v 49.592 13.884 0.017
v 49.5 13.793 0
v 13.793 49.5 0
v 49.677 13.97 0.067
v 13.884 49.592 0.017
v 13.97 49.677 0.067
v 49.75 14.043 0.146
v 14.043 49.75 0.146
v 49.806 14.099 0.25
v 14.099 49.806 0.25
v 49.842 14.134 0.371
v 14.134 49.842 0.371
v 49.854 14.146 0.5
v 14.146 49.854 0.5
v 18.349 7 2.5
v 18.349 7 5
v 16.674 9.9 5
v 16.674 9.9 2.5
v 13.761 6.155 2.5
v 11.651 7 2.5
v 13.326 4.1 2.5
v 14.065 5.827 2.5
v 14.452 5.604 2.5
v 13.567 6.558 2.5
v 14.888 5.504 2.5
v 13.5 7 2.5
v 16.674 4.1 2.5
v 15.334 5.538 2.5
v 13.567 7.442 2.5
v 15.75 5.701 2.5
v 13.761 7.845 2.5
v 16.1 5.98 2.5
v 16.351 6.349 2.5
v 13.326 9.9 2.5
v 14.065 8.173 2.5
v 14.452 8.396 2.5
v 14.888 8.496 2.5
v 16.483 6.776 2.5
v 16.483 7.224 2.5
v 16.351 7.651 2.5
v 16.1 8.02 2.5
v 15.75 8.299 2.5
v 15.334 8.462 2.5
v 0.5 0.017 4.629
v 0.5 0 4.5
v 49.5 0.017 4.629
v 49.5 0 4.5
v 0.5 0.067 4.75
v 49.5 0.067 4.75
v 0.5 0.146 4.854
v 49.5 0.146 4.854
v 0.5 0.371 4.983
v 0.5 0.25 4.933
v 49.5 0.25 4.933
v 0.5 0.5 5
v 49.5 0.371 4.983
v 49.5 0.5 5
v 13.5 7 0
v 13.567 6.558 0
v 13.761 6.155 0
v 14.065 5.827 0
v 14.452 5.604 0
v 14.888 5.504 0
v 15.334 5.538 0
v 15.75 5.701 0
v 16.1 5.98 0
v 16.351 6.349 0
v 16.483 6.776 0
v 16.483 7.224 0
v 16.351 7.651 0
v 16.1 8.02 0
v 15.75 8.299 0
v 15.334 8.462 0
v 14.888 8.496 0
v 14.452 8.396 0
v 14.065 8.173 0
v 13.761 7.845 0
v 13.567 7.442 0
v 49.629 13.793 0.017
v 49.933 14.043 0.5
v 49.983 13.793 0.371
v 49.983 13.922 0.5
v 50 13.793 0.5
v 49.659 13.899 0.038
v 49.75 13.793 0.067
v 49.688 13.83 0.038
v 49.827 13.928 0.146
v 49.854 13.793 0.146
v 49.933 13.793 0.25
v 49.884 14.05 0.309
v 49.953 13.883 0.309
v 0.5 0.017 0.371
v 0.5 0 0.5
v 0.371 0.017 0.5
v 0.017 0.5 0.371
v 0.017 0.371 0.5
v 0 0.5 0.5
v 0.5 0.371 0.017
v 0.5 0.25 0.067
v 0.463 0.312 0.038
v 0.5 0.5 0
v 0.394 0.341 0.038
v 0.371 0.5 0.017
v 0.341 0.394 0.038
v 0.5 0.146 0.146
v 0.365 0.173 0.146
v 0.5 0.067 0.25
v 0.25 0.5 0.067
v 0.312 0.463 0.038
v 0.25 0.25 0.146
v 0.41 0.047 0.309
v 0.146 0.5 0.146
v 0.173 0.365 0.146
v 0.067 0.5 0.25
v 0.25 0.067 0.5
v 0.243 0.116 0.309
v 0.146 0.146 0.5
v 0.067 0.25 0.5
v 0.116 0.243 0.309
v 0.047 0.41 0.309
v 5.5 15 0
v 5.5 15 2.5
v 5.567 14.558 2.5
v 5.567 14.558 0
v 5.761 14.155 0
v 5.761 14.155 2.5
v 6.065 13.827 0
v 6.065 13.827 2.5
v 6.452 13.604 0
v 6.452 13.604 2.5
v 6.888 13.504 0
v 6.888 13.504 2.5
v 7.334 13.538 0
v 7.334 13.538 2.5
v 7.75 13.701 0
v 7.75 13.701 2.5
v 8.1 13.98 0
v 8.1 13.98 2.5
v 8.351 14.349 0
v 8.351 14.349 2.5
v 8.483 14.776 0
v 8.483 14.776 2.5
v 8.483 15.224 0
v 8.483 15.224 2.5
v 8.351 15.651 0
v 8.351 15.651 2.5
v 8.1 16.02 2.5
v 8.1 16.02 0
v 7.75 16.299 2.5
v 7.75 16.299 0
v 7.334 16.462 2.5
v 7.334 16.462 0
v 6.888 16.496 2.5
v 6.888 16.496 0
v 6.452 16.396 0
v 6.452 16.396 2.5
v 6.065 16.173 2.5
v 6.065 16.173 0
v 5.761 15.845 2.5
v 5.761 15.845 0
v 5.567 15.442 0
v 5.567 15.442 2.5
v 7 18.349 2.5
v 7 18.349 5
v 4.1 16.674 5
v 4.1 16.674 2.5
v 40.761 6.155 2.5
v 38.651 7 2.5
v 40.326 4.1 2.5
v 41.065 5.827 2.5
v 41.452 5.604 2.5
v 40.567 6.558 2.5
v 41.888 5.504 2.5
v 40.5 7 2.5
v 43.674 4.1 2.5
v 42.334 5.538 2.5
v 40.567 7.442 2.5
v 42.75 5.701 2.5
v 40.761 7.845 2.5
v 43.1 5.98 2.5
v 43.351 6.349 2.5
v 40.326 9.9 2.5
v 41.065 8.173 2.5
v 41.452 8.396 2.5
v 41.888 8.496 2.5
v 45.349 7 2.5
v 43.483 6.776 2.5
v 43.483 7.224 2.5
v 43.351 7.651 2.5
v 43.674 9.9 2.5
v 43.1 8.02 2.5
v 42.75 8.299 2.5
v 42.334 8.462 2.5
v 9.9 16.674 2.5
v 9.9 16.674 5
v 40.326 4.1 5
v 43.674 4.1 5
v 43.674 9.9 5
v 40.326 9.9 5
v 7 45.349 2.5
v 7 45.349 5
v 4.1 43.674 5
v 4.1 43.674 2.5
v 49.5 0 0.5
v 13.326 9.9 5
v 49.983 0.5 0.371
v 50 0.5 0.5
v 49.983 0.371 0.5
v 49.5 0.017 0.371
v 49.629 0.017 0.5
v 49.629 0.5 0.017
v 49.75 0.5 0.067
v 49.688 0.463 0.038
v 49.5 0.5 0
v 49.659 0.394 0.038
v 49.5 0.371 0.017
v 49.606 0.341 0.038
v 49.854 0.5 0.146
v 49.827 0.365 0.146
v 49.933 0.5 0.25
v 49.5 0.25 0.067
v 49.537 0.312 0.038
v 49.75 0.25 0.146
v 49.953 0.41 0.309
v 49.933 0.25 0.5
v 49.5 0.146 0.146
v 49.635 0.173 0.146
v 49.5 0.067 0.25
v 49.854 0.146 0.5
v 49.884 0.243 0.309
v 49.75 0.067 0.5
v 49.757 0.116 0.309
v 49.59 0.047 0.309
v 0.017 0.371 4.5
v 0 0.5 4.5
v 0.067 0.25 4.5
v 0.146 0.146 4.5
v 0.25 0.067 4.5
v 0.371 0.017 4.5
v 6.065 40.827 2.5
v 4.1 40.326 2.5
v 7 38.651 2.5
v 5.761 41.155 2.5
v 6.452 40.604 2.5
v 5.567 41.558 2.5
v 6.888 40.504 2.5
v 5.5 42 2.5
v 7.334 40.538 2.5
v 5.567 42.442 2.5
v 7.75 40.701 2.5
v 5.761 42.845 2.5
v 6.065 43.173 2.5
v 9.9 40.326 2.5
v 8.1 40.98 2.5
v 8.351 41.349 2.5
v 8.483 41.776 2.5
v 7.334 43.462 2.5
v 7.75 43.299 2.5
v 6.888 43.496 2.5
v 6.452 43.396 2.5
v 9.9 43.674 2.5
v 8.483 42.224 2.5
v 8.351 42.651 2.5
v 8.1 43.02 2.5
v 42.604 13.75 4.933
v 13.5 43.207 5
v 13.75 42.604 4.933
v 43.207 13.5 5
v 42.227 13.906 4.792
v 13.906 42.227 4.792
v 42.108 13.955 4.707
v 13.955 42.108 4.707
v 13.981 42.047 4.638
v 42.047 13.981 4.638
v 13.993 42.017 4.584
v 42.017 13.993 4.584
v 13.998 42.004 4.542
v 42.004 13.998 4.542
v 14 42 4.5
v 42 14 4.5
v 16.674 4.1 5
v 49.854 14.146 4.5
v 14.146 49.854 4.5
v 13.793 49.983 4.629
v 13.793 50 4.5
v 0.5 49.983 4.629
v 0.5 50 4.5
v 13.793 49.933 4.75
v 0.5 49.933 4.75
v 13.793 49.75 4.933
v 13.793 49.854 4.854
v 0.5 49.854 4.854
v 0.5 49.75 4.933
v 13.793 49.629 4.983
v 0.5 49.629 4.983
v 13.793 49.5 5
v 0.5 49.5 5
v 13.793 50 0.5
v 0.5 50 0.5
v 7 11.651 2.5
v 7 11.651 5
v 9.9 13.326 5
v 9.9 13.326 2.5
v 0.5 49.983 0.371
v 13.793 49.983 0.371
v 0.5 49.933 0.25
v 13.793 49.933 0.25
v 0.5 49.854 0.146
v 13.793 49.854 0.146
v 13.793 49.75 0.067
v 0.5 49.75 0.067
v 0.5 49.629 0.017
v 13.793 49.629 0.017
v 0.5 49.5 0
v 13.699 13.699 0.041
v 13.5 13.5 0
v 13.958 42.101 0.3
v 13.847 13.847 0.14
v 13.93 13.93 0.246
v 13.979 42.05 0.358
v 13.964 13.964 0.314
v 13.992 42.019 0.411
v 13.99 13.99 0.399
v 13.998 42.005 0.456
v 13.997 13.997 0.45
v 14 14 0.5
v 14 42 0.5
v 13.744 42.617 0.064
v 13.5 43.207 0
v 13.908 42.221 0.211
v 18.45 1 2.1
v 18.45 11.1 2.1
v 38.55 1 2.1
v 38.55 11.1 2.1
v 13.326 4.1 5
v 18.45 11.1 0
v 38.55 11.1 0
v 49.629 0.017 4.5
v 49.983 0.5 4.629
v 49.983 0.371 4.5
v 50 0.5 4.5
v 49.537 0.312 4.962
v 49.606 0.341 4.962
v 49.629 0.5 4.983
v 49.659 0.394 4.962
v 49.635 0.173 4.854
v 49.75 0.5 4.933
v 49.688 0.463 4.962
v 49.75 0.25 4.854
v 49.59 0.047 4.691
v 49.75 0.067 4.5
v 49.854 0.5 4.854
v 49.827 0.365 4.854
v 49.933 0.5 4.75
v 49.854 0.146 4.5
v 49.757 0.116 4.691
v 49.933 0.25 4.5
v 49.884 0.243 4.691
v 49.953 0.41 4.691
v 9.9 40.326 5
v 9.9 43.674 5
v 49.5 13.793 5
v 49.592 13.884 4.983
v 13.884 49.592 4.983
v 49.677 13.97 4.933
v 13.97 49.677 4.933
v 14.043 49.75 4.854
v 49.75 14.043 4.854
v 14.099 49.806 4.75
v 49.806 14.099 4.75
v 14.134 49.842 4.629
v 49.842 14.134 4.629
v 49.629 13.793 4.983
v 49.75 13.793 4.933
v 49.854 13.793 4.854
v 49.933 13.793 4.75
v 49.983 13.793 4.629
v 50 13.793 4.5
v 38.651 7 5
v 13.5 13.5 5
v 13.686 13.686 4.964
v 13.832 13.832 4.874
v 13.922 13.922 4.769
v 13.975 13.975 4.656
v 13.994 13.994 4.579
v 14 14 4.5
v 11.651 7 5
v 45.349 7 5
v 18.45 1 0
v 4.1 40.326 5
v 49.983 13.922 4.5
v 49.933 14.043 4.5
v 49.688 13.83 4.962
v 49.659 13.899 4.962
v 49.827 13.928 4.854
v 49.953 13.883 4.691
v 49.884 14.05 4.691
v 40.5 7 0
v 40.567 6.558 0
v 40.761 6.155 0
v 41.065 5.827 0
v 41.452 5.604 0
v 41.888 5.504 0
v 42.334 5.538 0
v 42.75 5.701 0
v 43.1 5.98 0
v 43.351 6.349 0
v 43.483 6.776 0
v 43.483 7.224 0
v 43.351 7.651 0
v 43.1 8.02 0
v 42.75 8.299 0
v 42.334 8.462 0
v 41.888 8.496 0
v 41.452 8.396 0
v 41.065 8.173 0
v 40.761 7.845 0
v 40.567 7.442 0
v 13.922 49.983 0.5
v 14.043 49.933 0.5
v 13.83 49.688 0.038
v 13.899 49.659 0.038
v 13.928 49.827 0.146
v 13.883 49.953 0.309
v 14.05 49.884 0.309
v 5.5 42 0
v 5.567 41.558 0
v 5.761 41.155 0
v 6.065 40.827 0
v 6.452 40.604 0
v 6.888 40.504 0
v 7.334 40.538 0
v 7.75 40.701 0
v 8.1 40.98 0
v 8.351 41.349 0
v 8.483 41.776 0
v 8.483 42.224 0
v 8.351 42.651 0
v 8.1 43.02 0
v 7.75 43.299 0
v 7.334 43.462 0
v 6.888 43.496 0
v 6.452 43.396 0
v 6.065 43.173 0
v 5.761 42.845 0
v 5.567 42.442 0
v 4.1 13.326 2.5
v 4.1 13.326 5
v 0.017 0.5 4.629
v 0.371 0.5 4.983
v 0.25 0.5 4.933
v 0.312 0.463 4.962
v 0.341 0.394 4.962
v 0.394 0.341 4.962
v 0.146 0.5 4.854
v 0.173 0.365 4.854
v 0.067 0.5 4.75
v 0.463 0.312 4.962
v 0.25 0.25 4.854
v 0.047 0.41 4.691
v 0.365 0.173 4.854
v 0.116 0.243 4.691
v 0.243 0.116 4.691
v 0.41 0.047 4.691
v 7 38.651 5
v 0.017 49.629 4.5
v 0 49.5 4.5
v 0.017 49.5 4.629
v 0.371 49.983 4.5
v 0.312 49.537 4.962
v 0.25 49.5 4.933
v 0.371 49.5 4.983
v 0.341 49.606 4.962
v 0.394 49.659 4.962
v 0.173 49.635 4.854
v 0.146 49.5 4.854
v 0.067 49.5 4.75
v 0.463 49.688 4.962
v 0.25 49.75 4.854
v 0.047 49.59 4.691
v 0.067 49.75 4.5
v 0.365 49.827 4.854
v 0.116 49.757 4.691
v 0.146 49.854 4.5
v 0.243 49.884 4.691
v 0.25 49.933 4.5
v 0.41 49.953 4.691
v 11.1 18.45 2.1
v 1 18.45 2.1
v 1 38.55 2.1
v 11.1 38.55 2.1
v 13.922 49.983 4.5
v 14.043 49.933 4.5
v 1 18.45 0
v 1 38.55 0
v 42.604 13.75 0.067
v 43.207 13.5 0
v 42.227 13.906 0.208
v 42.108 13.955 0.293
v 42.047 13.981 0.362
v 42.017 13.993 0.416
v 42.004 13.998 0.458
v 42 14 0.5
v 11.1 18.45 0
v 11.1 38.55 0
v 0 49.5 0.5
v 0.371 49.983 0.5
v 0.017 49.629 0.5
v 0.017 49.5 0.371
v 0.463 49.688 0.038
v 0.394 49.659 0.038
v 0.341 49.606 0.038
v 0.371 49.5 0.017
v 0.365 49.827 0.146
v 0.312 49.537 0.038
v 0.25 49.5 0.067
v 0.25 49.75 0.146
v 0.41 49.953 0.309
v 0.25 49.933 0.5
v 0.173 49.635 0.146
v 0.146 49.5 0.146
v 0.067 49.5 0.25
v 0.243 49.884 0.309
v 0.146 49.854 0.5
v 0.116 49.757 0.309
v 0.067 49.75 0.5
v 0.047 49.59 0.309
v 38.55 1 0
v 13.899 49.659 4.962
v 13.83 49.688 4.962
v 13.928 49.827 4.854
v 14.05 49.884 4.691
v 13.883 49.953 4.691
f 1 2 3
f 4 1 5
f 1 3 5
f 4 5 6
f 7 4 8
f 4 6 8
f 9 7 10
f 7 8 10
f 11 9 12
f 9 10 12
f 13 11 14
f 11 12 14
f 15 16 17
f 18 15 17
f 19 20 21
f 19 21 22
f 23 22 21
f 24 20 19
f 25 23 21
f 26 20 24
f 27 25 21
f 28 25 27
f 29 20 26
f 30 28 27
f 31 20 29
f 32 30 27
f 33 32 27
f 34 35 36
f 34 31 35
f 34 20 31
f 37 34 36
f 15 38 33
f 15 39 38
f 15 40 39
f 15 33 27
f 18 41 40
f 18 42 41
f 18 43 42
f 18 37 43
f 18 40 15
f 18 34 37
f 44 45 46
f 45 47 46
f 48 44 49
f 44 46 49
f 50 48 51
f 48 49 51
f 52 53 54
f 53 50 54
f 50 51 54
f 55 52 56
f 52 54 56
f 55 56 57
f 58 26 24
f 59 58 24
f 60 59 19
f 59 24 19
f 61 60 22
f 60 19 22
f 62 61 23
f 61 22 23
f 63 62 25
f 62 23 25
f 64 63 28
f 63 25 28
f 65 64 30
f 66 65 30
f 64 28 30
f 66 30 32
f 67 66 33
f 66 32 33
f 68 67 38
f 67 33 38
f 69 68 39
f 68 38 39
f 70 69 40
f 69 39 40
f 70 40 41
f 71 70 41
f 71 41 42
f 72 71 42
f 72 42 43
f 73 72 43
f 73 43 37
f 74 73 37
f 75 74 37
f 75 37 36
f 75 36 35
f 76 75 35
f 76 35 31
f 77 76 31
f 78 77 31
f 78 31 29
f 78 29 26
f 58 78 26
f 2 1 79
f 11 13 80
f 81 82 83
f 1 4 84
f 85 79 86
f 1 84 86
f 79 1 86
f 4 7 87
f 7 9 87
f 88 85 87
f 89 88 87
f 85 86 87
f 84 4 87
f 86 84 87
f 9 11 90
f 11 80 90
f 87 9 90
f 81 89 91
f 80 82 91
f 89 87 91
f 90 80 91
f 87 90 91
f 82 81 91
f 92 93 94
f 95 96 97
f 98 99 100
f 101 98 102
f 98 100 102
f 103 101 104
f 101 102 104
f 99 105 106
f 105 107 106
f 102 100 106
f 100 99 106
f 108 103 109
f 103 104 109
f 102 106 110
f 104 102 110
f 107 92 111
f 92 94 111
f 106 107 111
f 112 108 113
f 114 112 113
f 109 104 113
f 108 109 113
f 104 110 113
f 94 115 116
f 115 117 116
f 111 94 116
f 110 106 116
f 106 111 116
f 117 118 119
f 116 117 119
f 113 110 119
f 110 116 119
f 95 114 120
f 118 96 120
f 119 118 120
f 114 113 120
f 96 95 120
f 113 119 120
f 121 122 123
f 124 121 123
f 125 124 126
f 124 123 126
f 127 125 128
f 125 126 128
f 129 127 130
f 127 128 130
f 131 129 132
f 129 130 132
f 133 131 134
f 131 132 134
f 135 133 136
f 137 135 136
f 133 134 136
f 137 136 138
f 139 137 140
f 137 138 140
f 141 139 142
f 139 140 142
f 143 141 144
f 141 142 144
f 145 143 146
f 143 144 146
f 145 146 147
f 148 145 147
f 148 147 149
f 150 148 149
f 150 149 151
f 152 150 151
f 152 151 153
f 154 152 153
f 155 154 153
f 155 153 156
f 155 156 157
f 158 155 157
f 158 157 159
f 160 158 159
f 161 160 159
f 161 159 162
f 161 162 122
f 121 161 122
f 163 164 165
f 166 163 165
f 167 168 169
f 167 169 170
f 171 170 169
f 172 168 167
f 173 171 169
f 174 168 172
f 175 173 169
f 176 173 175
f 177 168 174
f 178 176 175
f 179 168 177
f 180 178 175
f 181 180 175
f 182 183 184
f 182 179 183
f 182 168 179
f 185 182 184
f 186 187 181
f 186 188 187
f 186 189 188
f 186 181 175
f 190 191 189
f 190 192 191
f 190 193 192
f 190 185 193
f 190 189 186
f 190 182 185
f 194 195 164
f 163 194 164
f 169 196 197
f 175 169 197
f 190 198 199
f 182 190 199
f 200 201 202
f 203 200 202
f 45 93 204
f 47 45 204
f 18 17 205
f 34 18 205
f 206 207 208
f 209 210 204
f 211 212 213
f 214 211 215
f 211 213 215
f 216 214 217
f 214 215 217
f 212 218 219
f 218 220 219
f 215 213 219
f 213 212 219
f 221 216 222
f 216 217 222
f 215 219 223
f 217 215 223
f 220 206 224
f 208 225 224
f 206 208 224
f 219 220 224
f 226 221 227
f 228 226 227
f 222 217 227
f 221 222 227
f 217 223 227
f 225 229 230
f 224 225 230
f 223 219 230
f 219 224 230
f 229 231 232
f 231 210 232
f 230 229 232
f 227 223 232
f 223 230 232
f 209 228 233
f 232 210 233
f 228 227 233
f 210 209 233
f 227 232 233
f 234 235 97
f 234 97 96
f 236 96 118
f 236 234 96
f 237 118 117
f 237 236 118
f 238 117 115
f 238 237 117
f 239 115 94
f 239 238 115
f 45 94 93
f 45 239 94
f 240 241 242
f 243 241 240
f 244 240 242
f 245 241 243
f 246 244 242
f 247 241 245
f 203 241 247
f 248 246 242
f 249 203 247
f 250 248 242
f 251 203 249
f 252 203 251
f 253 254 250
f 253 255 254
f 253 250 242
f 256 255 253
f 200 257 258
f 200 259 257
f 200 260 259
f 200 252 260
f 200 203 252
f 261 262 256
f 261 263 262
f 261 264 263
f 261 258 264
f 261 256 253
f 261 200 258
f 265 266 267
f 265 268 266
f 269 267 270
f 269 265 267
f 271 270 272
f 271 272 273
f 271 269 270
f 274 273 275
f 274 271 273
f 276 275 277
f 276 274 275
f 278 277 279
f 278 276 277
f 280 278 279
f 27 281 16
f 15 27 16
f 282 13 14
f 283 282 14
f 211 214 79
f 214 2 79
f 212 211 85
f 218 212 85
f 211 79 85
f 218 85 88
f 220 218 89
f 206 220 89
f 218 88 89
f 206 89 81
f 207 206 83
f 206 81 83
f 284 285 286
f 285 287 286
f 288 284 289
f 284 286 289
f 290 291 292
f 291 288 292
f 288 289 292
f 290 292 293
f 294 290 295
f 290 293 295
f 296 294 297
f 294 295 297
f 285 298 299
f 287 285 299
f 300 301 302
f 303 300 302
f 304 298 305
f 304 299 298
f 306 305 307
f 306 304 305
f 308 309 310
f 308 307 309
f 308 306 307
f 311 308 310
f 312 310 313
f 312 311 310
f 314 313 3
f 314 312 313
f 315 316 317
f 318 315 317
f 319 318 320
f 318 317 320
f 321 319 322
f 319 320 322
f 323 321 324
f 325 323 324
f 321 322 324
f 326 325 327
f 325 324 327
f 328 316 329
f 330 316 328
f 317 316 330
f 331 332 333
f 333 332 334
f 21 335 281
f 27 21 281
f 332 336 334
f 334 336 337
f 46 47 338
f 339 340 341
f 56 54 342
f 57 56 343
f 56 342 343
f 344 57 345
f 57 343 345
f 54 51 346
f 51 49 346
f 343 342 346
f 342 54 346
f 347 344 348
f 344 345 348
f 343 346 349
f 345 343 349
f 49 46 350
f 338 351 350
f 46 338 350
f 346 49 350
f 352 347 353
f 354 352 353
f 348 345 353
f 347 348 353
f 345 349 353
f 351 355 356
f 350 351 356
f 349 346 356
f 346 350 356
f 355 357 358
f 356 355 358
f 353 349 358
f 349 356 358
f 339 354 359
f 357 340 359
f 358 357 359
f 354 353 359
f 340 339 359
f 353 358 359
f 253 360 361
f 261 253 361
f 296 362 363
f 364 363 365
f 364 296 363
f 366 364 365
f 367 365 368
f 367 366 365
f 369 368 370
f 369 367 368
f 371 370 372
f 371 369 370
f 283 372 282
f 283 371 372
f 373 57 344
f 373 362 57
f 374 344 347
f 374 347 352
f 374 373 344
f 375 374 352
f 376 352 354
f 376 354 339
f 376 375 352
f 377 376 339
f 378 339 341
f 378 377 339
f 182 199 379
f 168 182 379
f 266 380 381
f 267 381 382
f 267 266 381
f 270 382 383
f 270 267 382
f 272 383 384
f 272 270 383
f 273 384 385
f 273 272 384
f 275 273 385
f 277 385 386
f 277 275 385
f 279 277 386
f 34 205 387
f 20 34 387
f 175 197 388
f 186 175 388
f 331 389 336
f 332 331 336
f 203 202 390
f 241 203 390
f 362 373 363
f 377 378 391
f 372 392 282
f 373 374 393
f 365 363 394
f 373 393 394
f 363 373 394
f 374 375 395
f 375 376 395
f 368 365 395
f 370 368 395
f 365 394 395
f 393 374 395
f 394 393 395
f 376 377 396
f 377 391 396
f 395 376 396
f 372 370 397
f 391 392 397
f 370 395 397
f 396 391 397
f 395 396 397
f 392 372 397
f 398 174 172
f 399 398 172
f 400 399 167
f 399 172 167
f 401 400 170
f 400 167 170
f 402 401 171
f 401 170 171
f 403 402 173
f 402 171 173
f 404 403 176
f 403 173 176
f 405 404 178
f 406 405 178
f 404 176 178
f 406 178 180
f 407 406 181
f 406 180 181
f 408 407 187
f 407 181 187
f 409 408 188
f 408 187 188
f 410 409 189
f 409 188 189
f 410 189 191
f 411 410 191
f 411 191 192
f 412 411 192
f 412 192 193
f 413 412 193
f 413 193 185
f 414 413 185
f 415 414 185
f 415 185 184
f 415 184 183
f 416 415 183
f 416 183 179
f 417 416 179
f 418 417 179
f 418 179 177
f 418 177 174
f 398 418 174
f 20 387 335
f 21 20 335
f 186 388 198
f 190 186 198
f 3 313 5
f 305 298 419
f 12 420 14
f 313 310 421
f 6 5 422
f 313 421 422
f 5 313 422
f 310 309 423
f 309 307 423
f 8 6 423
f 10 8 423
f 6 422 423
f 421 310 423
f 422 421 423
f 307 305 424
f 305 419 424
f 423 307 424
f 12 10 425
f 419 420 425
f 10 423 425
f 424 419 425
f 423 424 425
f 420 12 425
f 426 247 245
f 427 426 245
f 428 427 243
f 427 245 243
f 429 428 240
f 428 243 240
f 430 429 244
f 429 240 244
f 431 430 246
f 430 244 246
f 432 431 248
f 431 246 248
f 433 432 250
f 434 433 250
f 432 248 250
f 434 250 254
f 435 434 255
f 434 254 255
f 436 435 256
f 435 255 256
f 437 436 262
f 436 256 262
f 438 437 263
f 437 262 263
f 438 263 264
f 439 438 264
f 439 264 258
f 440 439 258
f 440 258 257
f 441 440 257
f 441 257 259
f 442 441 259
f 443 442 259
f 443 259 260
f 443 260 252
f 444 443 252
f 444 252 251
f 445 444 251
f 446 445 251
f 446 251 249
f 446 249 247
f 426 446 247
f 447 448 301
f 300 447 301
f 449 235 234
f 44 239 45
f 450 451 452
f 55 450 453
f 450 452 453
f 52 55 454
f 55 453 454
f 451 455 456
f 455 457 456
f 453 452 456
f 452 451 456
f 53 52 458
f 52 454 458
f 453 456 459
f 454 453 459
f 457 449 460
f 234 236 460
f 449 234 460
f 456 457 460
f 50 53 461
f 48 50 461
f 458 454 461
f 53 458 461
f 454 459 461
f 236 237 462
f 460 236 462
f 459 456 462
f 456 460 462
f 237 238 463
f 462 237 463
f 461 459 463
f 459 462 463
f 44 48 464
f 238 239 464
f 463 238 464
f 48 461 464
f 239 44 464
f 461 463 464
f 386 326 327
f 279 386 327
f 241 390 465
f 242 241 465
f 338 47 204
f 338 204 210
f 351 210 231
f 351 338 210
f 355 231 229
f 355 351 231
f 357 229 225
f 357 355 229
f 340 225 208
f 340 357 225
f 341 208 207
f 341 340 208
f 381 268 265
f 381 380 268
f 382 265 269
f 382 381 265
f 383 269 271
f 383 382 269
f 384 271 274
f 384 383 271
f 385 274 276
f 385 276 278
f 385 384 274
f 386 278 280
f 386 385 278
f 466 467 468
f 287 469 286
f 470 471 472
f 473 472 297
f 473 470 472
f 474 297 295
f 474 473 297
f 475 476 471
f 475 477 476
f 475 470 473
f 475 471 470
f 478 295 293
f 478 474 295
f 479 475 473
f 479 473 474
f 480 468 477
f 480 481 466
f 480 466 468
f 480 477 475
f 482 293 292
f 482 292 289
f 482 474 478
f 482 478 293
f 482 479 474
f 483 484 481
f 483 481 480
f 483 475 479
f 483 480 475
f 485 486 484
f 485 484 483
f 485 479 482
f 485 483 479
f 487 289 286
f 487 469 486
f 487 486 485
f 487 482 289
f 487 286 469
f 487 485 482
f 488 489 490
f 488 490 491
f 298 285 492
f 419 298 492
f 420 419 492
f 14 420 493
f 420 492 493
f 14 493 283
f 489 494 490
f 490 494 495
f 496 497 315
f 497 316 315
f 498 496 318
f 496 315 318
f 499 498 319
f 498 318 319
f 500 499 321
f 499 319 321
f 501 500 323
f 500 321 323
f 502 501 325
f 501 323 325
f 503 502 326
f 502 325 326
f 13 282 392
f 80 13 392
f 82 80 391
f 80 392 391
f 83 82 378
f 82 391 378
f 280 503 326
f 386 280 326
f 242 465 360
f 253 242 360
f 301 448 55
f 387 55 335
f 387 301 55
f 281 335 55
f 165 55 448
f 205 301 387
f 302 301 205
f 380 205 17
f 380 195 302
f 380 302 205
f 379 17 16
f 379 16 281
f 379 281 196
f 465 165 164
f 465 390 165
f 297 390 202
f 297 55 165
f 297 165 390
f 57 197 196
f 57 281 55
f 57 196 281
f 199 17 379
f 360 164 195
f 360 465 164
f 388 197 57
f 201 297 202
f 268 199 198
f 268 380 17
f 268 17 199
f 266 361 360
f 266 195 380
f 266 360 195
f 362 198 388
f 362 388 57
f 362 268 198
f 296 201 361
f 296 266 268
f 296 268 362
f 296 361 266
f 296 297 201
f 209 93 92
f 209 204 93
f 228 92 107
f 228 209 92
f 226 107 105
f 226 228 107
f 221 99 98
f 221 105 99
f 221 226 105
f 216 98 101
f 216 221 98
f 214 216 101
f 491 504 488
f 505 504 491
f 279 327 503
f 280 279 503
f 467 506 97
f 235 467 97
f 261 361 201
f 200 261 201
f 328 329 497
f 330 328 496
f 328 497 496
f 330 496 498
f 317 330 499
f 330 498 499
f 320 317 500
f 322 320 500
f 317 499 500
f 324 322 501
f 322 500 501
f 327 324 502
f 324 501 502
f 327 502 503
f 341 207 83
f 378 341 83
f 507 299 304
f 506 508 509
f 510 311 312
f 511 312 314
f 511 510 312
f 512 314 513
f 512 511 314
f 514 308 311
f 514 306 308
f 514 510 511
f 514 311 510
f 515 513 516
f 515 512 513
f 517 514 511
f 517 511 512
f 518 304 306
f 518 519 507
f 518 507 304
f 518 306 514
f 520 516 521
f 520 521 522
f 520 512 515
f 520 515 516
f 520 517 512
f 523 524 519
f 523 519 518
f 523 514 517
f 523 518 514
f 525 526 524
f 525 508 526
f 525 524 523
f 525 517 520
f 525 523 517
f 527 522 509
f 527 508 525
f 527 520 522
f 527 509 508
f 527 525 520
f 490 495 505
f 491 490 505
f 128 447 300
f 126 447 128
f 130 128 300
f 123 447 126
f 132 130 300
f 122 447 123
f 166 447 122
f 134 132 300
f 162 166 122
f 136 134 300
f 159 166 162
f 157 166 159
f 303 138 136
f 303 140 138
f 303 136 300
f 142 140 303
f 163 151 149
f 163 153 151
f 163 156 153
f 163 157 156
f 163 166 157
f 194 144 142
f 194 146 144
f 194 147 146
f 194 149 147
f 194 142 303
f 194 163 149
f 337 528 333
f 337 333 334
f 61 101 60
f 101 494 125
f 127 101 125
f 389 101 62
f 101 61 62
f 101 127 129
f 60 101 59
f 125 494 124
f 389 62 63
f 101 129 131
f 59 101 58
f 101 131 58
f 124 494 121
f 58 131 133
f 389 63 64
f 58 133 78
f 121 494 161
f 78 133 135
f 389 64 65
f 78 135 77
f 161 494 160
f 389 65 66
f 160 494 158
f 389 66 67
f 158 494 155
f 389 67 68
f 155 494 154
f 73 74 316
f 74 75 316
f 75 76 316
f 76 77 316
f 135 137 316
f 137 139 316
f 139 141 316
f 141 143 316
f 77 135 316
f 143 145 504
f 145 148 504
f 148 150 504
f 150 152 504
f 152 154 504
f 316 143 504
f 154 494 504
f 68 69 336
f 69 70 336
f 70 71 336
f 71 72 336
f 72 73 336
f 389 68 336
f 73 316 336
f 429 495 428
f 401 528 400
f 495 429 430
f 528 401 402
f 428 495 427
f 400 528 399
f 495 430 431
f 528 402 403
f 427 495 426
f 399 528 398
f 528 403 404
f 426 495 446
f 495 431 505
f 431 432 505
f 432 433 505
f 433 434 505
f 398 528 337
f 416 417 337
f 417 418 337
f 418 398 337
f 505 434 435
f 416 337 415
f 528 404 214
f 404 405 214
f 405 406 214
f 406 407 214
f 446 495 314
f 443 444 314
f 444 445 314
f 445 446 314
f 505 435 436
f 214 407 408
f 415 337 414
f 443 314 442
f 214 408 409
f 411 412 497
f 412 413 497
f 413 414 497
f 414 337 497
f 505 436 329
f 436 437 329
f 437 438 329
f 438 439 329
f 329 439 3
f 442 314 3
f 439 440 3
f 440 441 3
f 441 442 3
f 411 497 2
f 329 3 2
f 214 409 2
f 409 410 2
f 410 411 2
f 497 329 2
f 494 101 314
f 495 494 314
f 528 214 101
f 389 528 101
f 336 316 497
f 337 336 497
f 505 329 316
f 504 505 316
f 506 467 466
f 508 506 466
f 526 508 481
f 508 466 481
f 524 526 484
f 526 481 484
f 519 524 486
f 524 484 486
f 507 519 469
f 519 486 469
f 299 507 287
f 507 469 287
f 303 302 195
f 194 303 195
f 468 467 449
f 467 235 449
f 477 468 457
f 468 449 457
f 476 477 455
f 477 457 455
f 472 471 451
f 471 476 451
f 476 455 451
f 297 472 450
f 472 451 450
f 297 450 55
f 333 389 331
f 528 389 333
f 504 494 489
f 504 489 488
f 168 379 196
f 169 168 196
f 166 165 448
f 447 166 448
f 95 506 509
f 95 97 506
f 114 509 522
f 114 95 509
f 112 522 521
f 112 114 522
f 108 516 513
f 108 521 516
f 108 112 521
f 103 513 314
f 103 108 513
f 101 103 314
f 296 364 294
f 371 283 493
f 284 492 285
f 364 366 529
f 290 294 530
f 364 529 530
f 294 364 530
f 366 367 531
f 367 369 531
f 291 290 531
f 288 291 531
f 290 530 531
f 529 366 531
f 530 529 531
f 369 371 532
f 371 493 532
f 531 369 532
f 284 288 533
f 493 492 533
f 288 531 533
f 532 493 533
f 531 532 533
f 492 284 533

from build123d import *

# Parameters (mm, degrees)
F0_W     = 20.1
F0_H     = 10.1
F0_W_2   = 10.1
F0_H_2   = 20.1
F1_DEPTH = 5
F2_DEPTH = 2.1
F3_D     = 3
F5_DEPTH = 2.5
F6_R     = 0.5


with BuildPart() as f1:
    # F0 (on Top) → F1 (new body)
    with BuildSketch(Plane.XY):
        Polygon((0, 50), (0, 0), (50, 0), (50, 14), (42, 14), (14, 14), (14, 42), (14, 50), align=None)
        with Locations((28.5, 6.05)):
            Rectangle(F0_W, F0_H, mode=Mode.SUBTRACT)
        with Locations((6.05, 28.5)):
            Rectangle(F0_W_2, F0_H_2, mode=Mode.SUBTRACT)
        Polygon((42, 14), (50, 14), (14, 50), (14, 42), align=None)
        with Locations((6.05, 28.5)):
            Rectangle(F0_W_2, F0_H_2)
        with Locations((28.5, 6.05)):
            Rectangle(F0_W, F0_H)
    extrude(amount=F1_DEPTH)

    # F0 (on Top) → F2 (cut)
    with BuildSketch(Plane.XY):
        with Locations((6.05, 28.5)):
            Rectangle(F0_W_2, F0_H_2)
        with Locations((28.5, 6.05)):
            Rectangle(F0_W, F0_H)
    extrude(amount=F2_DEPTH, mode=Mode.SUBTRACT)

    # F3 (through all)
    with Locations(Plane(origin=(0, 0, 0), x_dir=(1, 0, 0), z_dir=(0, 0, -1))):
        with Locations((7, -15), (15, -7), (42, -7), (7, -42)):
            Hole(F3_D / 2)

    # F4 (on face) → F5 (cut)
    with BuildSketch(Plane.XY.offset(5)):
        Polygon((7, 45.3486315613), (4.1, 43.6743157806), (4.1, 40.3256842194), (7, 38.6513684387), (9.9, 40.3256842194), (9.9, 43.6743157806), align=None)
        Polygon((7, 18.3486315613), (4.1, 16.6743157806), (4.1, 13.3256842194), (7, 11.6513684387), (9.9, 13.3256842194), (9.9, 16.6743157806), align=None)
        Polygon((18.3486315613, 7), (16.6743157806, 9.9), (13.3256842194, 9.9), (11.6513684387, 7), (13.3256842194, 4.1), (16.6743157806, 4.1), align=None)
        Polygon((40.3256842194, 9.9), (38.6513684387, 7), (40.3256842194, 4.1), (43.6743157806, 4.1), (45.3486315613, 7), (43.6743157806, 9.9), align=None)
    extrude(amount=-F5_DEPTH, mode=Mode.SUBTRACT)

    # F6
    f6_edges = [f1.edges().sort_by_distance(p)[0] for p in [
        (0, 0, 2.5),
        (50, 0, 2.5),
        (50, 14, 2.5),
        (14, 50, 2.5),
        (0, 50, 2.5),
        (0, 25, 5),
        (7, 50, 0),
        (32, 32, 0),
        (50, 7, 0),
        (25, 0, 0),
        (28, 14, 0),
        (28, 28, 0),
        (14, 28, 0),
        (0, 25, 0),
        (25, 0, 5),
        (50, 7, 5),
        (32, 32, 5),
        (14, 28, 5),
        (28, 28, 5),
        (28, 14, 5),
        (7, 50, 5),
    ]]
    fillet(f6_edges, radius=F6_R)


solid = f1.part
